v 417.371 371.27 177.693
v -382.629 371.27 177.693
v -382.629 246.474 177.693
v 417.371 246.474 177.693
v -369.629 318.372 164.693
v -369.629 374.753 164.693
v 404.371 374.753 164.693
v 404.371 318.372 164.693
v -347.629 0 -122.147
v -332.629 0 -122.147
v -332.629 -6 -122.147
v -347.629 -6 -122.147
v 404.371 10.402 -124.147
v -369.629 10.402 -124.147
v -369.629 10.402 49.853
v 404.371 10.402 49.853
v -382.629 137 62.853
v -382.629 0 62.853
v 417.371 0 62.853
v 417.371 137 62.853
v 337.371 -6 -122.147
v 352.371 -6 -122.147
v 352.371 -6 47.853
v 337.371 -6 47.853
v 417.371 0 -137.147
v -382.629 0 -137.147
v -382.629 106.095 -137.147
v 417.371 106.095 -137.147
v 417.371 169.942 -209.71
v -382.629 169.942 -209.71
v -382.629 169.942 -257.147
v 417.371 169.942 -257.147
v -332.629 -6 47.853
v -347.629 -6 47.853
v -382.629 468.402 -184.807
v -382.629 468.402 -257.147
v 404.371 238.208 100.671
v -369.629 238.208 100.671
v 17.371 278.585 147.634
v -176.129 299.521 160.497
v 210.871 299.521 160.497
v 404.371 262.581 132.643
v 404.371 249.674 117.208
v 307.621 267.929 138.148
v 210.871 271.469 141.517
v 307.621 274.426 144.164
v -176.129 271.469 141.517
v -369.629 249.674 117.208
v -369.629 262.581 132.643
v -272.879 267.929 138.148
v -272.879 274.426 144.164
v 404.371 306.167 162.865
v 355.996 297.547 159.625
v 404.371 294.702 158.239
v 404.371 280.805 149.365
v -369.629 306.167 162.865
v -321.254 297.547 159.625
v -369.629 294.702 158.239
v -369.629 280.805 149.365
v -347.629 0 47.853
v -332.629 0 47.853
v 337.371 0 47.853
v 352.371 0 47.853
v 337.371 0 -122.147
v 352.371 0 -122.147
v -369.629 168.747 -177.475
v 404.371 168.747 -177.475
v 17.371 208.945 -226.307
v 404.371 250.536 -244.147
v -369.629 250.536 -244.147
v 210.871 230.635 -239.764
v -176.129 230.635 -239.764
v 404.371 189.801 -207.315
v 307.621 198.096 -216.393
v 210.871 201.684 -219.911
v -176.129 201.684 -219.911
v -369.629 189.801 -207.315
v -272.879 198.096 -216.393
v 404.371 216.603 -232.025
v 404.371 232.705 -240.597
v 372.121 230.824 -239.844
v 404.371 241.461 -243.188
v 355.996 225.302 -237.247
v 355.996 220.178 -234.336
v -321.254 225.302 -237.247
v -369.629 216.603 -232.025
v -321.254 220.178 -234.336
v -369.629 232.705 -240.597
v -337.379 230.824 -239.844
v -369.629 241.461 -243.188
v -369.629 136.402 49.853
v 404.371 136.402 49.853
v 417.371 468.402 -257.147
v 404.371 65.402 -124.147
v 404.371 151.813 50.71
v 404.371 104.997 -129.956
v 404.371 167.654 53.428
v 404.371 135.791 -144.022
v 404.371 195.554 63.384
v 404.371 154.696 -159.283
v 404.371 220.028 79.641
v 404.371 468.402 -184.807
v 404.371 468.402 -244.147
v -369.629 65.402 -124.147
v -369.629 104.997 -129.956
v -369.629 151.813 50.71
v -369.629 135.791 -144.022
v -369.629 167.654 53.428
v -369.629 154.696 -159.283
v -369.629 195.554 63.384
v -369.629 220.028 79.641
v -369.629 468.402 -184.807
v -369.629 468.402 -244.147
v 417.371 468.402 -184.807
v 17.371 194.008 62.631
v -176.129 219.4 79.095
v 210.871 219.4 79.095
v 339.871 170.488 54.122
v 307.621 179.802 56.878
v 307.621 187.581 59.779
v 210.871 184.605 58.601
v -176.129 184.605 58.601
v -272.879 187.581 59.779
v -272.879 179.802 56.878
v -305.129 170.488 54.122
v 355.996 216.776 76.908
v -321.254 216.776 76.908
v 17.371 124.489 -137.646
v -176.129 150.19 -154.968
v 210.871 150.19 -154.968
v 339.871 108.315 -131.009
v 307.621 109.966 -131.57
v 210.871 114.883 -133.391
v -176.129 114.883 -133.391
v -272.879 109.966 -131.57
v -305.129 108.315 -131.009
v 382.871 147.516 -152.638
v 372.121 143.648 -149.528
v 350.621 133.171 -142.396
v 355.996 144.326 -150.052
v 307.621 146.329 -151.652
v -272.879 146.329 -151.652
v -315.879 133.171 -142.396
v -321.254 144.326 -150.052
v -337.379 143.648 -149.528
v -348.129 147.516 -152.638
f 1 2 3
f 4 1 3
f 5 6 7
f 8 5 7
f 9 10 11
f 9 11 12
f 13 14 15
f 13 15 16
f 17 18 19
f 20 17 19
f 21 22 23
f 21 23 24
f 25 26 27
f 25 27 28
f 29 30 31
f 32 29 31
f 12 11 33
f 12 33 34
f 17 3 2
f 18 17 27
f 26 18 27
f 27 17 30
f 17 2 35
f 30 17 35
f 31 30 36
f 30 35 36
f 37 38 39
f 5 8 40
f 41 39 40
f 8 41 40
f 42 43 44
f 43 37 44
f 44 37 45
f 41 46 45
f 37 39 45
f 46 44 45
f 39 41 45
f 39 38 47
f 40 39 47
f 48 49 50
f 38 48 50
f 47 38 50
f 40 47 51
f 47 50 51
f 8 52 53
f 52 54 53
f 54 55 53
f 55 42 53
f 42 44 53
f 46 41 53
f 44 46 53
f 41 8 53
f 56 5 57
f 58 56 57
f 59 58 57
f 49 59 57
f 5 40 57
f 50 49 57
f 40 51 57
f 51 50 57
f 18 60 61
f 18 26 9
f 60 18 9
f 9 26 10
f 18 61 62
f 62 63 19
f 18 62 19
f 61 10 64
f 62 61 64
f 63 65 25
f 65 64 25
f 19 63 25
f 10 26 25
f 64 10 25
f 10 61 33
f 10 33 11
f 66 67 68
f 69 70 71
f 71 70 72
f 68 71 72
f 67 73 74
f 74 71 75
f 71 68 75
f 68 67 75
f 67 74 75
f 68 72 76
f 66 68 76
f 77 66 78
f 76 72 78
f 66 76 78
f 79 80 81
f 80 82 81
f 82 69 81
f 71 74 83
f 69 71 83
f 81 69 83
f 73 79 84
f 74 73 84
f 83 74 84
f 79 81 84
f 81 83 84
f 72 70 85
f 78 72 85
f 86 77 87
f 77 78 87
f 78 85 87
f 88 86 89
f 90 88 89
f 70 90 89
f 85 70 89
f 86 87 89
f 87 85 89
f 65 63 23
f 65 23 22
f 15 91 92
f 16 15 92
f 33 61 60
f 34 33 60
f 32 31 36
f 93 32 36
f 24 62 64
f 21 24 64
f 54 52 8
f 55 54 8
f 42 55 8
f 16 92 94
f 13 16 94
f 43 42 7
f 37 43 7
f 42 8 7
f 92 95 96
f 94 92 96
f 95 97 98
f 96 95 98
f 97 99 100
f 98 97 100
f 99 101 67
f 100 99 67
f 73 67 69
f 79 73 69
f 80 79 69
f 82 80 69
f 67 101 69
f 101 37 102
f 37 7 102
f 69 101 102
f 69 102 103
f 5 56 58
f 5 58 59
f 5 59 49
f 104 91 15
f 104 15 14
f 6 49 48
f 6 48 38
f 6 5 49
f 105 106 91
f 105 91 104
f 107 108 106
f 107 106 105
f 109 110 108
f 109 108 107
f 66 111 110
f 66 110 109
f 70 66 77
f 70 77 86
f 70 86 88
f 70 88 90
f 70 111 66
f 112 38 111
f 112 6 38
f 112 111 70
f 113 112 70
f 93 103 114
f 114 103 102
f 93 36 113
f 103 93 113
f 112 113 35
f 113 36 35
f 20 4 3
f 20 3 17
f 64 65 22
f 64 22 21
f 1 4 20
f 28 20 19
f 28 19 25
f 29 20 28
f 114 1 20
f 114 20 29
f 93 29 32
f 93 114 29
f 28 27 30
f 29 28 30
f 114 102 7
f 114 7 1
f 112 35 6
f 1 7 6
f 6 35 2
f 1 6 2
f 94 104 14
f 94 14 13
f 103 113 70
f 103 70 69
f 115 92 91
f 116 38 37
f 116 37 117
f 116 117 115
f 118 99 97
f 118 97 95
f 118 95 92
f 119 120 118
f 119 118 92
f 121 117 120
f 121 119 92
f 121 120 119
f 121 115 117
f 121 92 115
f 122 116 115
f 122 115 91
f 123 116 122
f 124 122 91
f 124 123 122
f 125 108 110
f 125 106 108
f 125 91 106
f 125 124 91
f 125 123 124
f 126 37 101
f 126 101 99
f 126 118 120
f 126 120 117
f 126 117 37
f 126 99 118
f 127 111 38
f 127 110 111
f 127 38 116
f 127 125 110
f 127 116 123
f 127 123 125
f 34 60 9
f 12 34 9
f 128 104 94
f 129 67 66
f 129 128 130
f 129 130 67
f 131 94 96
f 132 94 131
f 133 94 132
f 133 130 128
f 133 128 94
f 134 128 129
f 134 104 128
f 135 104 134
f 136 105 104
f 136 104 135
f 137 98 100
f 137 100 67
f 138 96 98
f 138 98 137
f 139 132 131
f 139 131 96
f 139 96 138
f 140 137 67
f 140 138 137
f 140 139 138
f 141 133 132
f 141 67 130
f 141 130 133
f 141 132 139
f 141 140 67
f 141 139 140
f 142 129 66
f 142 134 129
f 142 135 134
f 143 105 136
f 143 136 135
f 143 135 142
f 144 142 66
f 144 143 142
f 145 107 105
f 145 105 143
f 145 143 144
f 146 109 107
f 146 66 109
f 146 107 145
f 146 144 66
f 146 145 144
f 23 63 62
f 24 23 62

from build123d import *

# Parameters (mm, degrees)
SKIZZE1_W                       = 800
SKIZZE1_H                       = 200
AUFSATZ_LINEAR_AUSTRAGEN1_DEPTH = 274
SKIZZE2_W                       = 15
SKIZZE2_H                       = 170
AUFSATZ_LINEAR_AUSTRAGEN2_DEPTH = 6
AUFSATZ_LINEAR_AUSTRAGEN4_DEPTH = 800
SKIZZE8_W                       = 774
SKIZZE8_H                       = 408.84
SCHNITT_LINEAR_AUSTRAGEN3_DEPTH = 217
SKIZZE9_W                       = 774
SKIZZE9_H                       = 294
SCHNITT_LINEAR_AUSTRAGEN4_DEPTH = 71
SKIZZE10_W                      = 774
SKIZZE10_H                      = 174
SCHNITT_LINEAR_AUSTRAGEN5_DEPTH = 170
VERRUNDUNG1_SIZE                = 115
VERRUNDUNG1_SIZE_2              = 95
VERRUNDUNG2_SIZE                = 95
VERRUNDUNG2_SIZE_2              = 115
VERRUNDUNG3_START               = -371
VERRUNDUNG3_DEPTH               = 776


with BuildPart() as part:
    # Skizze1 → Aufsatz-Linear austragen1 (new body)
    with BuildSketch(Plane(origin=(0, 0, 0), x_dir=(1, 0, 0), z_dir=(0, 1, 0))):
        with Locations((17.371106882, 37.147335423)):
            Rectangle(SKIZZE1_W, SKIZZE1_H)
    extrude(amount=AUFSATZ_LINEAR_AUSTRAGEN1_DEPTH)

    # Skizze2 → Aufsatz-Linear austragen2 (add)
    with BuildSketch(Plane(origin=(0, 0, 0), x_dir=(-1, 0, 0), z_dir=(0, -1, 0))):
        with Locations((340.128893118, 37.147335423)):
            Rectangle(SKIZZE2_W, SKIZZE2_H)
        with Locations((-344.871106882, 37.147335423)):
            Rectangle(SKIZZE2_W, SKIZZE2_H)
    extrude(amount=AUFSATZ_LINEAR_AUSTRAGEN2_DEPTH)

    # Skizze7 → Aufsatz-Linear austragen4 (add)
    with BuildSketch(Plane.ZY.offset(382.628893118)):
        Polygon((-137.147335423, 106.095397632), (-209.709609496, 169.941826261), (-257.147335423, 169.941826261), (-257.147335423, 468.401582256), (-184.807335423, 468.401582256), (177.692664577, 371.27), (177.692664577, 246.474221491), (62.852664577, 137), align=None)
    extrude(amount=-AUFSATZ_LINEAR_AUSTRAGEN4_DEPTH)

    # Skizze8 → Schnitt-Linear austragen3 (cut)
    with BuildSketch(Plane(origin=(0, 468.401582256, 0), x_dir=(1, 0, 0), z_dir=(0, 1, 0))):
        with Locations((17.371106882, 39.727335423)):
            Rectangle(SKIZZE8_W, SKIZZE8_H)
    extrude(amount=-SCHNITT_LINEAR_AUSTRAGEN3_DEPTH, mode=Mode.SUBTRACT)

    # Skizze9 → Schnitt-Linear austragen4 (cut)
    with BuildSketch(Plane(origin=(0, 251.401582256, 0), x_dir=(1, 0, 0), z_dir=(0, 1, 0))):
        with Locations((17.371106882, 97.147335423)):
            Rectangle(SKIZZE9_W, SKIZZE9_H)
    extrude(amount=-SCHNITT_LINEAR_AUSTRAGEN4_DEPTH, mode=Mode.SUBTRACT)

    # Skizze10 → Schnitt-Linear austragen5 (cut)
    with BuildSketch(Plane(origin=(0, 180.401582256, 0), x_dir=(1, 0, 0), z_dir=(0, 1, 0))):
        with Locations((17.371106882, 37.147335423)):
            Rectangle(SKIZZE10_W, SKIZZE10_H)
    extrude(amount=-SCHNITT_LINEAR_AUSTRAGEN5_DEPTH, mode=Mode.SUBTRACT)

    # Verrundung1
    # a fillet whose section is not a circle: 115, 95 mm, written as the material it takes off along each edge
    with BuildSketch(Plane(origin=(-369.628893118, 180.401582256, -124.147335423), x_dir=(0, -1, 0), z_dir=(1, 0, 0))) as verrundung1_piece_1:
        with BuildLine():
            Bezier((VERRUNDUNG1_SIZE, 0), (0, 0), (0, VERRUNDUNG1_SIZE_2), weights=[1, 0.707106781, 1])
            Line((0, VERRUNDUNG1_SIZE_2), (0, 0))
            Line((0, 0), (VERRUNDUNG1_SIZE, 0))
        make_face()
    extrude(amount=774, mode=Mode.SUBTRACT)

    # Verrundung2
    # a fillet whose section is not a circle: 115, 95 mm, written as the material it takes off along each edge
    with BuildSketch(Plane(origin=(-369.628893118, 251.401582256, 49.852664577), x_dir=(0, 0, 1), z_dir=(1, 0, 0))) as verrundung2_piece_1:
        with BuildLine():
            Bezier((VERRUNDUNG2_SIZE, 0), (0, 0), (0, VERRUNDUNG2_SIZE_2), weights=[1, 0.707106781, 1])
            Line((0, VERRUNDUNG2_SIZE_2), (0, 0))
            Line((0, 0), (VERRUNDUNG2_SIZE, 0))
        make_face()
    extrude(amount=774, mode=Mode.SUBTRACT)

    # Verrundung3: read off the stored shape, not the designer's step
    # Verrundung3 outline → Verrundung3 (add)
    with BuildSketch(Plane.YZ.offset(VERRUNDUNG3_START)):
        with BuildLine():
            add(Edge.make_bspline(
                [(251.401582257, 144.852664577), (251.401582257, 121.417687853), (238.208250652, 100.671279991)],
                knots=[0, 0, 0, 0.316521674, 0.316521674, 0.316521674], degree=2, weights=[1, 0.907292948, 0.873273479]))
            add(Edge.make_bspline(
                [(238.208250652, 100.671279991), (278.921580984, 164.69266458), (318.371713455, 164.692664577)],
                knots=[0, 0, 0, 1, 1, 1], degree=2, weights=[1, 0.876532088, 1]))
            Line((318.371713455, 164.692664577), (251.401582251, 164.692664573))
            Line((251.401582251, 164.692664573), (251.401582257, 144.852664577))
        make_face()
        with BuildLine():
            Line((180.401582251, -244.147335419), (250.535882306, -244.147335423))
            add(Edge.make_bspline(
                [(250.535882306, -244.147335423), (208.142607951, -244.147335414), (168.747010016, -177.475177999)],
                knots=[0, 0, 0, 1, 1, 1], degree=2, weights=[1, 0.868537314, 1]))
            add(Edge.make_bspline(
                [(168.747010016, -177.475177999), (180.401582257, -197.199094267), (180.401582257, -219.147335423)],
                knots=[0.70180493, 0.70180493, 0.70180493, 1, 1, 1], degree=2, weights=[0.877409678, 0.912660686, 1]))
            Line((180.401582257, -219.147335423), (180.401582251, -244.147335419))
        make_face()
    extrude(amount=VERRUNDUNG3_DEPTH)


solid = part.part
